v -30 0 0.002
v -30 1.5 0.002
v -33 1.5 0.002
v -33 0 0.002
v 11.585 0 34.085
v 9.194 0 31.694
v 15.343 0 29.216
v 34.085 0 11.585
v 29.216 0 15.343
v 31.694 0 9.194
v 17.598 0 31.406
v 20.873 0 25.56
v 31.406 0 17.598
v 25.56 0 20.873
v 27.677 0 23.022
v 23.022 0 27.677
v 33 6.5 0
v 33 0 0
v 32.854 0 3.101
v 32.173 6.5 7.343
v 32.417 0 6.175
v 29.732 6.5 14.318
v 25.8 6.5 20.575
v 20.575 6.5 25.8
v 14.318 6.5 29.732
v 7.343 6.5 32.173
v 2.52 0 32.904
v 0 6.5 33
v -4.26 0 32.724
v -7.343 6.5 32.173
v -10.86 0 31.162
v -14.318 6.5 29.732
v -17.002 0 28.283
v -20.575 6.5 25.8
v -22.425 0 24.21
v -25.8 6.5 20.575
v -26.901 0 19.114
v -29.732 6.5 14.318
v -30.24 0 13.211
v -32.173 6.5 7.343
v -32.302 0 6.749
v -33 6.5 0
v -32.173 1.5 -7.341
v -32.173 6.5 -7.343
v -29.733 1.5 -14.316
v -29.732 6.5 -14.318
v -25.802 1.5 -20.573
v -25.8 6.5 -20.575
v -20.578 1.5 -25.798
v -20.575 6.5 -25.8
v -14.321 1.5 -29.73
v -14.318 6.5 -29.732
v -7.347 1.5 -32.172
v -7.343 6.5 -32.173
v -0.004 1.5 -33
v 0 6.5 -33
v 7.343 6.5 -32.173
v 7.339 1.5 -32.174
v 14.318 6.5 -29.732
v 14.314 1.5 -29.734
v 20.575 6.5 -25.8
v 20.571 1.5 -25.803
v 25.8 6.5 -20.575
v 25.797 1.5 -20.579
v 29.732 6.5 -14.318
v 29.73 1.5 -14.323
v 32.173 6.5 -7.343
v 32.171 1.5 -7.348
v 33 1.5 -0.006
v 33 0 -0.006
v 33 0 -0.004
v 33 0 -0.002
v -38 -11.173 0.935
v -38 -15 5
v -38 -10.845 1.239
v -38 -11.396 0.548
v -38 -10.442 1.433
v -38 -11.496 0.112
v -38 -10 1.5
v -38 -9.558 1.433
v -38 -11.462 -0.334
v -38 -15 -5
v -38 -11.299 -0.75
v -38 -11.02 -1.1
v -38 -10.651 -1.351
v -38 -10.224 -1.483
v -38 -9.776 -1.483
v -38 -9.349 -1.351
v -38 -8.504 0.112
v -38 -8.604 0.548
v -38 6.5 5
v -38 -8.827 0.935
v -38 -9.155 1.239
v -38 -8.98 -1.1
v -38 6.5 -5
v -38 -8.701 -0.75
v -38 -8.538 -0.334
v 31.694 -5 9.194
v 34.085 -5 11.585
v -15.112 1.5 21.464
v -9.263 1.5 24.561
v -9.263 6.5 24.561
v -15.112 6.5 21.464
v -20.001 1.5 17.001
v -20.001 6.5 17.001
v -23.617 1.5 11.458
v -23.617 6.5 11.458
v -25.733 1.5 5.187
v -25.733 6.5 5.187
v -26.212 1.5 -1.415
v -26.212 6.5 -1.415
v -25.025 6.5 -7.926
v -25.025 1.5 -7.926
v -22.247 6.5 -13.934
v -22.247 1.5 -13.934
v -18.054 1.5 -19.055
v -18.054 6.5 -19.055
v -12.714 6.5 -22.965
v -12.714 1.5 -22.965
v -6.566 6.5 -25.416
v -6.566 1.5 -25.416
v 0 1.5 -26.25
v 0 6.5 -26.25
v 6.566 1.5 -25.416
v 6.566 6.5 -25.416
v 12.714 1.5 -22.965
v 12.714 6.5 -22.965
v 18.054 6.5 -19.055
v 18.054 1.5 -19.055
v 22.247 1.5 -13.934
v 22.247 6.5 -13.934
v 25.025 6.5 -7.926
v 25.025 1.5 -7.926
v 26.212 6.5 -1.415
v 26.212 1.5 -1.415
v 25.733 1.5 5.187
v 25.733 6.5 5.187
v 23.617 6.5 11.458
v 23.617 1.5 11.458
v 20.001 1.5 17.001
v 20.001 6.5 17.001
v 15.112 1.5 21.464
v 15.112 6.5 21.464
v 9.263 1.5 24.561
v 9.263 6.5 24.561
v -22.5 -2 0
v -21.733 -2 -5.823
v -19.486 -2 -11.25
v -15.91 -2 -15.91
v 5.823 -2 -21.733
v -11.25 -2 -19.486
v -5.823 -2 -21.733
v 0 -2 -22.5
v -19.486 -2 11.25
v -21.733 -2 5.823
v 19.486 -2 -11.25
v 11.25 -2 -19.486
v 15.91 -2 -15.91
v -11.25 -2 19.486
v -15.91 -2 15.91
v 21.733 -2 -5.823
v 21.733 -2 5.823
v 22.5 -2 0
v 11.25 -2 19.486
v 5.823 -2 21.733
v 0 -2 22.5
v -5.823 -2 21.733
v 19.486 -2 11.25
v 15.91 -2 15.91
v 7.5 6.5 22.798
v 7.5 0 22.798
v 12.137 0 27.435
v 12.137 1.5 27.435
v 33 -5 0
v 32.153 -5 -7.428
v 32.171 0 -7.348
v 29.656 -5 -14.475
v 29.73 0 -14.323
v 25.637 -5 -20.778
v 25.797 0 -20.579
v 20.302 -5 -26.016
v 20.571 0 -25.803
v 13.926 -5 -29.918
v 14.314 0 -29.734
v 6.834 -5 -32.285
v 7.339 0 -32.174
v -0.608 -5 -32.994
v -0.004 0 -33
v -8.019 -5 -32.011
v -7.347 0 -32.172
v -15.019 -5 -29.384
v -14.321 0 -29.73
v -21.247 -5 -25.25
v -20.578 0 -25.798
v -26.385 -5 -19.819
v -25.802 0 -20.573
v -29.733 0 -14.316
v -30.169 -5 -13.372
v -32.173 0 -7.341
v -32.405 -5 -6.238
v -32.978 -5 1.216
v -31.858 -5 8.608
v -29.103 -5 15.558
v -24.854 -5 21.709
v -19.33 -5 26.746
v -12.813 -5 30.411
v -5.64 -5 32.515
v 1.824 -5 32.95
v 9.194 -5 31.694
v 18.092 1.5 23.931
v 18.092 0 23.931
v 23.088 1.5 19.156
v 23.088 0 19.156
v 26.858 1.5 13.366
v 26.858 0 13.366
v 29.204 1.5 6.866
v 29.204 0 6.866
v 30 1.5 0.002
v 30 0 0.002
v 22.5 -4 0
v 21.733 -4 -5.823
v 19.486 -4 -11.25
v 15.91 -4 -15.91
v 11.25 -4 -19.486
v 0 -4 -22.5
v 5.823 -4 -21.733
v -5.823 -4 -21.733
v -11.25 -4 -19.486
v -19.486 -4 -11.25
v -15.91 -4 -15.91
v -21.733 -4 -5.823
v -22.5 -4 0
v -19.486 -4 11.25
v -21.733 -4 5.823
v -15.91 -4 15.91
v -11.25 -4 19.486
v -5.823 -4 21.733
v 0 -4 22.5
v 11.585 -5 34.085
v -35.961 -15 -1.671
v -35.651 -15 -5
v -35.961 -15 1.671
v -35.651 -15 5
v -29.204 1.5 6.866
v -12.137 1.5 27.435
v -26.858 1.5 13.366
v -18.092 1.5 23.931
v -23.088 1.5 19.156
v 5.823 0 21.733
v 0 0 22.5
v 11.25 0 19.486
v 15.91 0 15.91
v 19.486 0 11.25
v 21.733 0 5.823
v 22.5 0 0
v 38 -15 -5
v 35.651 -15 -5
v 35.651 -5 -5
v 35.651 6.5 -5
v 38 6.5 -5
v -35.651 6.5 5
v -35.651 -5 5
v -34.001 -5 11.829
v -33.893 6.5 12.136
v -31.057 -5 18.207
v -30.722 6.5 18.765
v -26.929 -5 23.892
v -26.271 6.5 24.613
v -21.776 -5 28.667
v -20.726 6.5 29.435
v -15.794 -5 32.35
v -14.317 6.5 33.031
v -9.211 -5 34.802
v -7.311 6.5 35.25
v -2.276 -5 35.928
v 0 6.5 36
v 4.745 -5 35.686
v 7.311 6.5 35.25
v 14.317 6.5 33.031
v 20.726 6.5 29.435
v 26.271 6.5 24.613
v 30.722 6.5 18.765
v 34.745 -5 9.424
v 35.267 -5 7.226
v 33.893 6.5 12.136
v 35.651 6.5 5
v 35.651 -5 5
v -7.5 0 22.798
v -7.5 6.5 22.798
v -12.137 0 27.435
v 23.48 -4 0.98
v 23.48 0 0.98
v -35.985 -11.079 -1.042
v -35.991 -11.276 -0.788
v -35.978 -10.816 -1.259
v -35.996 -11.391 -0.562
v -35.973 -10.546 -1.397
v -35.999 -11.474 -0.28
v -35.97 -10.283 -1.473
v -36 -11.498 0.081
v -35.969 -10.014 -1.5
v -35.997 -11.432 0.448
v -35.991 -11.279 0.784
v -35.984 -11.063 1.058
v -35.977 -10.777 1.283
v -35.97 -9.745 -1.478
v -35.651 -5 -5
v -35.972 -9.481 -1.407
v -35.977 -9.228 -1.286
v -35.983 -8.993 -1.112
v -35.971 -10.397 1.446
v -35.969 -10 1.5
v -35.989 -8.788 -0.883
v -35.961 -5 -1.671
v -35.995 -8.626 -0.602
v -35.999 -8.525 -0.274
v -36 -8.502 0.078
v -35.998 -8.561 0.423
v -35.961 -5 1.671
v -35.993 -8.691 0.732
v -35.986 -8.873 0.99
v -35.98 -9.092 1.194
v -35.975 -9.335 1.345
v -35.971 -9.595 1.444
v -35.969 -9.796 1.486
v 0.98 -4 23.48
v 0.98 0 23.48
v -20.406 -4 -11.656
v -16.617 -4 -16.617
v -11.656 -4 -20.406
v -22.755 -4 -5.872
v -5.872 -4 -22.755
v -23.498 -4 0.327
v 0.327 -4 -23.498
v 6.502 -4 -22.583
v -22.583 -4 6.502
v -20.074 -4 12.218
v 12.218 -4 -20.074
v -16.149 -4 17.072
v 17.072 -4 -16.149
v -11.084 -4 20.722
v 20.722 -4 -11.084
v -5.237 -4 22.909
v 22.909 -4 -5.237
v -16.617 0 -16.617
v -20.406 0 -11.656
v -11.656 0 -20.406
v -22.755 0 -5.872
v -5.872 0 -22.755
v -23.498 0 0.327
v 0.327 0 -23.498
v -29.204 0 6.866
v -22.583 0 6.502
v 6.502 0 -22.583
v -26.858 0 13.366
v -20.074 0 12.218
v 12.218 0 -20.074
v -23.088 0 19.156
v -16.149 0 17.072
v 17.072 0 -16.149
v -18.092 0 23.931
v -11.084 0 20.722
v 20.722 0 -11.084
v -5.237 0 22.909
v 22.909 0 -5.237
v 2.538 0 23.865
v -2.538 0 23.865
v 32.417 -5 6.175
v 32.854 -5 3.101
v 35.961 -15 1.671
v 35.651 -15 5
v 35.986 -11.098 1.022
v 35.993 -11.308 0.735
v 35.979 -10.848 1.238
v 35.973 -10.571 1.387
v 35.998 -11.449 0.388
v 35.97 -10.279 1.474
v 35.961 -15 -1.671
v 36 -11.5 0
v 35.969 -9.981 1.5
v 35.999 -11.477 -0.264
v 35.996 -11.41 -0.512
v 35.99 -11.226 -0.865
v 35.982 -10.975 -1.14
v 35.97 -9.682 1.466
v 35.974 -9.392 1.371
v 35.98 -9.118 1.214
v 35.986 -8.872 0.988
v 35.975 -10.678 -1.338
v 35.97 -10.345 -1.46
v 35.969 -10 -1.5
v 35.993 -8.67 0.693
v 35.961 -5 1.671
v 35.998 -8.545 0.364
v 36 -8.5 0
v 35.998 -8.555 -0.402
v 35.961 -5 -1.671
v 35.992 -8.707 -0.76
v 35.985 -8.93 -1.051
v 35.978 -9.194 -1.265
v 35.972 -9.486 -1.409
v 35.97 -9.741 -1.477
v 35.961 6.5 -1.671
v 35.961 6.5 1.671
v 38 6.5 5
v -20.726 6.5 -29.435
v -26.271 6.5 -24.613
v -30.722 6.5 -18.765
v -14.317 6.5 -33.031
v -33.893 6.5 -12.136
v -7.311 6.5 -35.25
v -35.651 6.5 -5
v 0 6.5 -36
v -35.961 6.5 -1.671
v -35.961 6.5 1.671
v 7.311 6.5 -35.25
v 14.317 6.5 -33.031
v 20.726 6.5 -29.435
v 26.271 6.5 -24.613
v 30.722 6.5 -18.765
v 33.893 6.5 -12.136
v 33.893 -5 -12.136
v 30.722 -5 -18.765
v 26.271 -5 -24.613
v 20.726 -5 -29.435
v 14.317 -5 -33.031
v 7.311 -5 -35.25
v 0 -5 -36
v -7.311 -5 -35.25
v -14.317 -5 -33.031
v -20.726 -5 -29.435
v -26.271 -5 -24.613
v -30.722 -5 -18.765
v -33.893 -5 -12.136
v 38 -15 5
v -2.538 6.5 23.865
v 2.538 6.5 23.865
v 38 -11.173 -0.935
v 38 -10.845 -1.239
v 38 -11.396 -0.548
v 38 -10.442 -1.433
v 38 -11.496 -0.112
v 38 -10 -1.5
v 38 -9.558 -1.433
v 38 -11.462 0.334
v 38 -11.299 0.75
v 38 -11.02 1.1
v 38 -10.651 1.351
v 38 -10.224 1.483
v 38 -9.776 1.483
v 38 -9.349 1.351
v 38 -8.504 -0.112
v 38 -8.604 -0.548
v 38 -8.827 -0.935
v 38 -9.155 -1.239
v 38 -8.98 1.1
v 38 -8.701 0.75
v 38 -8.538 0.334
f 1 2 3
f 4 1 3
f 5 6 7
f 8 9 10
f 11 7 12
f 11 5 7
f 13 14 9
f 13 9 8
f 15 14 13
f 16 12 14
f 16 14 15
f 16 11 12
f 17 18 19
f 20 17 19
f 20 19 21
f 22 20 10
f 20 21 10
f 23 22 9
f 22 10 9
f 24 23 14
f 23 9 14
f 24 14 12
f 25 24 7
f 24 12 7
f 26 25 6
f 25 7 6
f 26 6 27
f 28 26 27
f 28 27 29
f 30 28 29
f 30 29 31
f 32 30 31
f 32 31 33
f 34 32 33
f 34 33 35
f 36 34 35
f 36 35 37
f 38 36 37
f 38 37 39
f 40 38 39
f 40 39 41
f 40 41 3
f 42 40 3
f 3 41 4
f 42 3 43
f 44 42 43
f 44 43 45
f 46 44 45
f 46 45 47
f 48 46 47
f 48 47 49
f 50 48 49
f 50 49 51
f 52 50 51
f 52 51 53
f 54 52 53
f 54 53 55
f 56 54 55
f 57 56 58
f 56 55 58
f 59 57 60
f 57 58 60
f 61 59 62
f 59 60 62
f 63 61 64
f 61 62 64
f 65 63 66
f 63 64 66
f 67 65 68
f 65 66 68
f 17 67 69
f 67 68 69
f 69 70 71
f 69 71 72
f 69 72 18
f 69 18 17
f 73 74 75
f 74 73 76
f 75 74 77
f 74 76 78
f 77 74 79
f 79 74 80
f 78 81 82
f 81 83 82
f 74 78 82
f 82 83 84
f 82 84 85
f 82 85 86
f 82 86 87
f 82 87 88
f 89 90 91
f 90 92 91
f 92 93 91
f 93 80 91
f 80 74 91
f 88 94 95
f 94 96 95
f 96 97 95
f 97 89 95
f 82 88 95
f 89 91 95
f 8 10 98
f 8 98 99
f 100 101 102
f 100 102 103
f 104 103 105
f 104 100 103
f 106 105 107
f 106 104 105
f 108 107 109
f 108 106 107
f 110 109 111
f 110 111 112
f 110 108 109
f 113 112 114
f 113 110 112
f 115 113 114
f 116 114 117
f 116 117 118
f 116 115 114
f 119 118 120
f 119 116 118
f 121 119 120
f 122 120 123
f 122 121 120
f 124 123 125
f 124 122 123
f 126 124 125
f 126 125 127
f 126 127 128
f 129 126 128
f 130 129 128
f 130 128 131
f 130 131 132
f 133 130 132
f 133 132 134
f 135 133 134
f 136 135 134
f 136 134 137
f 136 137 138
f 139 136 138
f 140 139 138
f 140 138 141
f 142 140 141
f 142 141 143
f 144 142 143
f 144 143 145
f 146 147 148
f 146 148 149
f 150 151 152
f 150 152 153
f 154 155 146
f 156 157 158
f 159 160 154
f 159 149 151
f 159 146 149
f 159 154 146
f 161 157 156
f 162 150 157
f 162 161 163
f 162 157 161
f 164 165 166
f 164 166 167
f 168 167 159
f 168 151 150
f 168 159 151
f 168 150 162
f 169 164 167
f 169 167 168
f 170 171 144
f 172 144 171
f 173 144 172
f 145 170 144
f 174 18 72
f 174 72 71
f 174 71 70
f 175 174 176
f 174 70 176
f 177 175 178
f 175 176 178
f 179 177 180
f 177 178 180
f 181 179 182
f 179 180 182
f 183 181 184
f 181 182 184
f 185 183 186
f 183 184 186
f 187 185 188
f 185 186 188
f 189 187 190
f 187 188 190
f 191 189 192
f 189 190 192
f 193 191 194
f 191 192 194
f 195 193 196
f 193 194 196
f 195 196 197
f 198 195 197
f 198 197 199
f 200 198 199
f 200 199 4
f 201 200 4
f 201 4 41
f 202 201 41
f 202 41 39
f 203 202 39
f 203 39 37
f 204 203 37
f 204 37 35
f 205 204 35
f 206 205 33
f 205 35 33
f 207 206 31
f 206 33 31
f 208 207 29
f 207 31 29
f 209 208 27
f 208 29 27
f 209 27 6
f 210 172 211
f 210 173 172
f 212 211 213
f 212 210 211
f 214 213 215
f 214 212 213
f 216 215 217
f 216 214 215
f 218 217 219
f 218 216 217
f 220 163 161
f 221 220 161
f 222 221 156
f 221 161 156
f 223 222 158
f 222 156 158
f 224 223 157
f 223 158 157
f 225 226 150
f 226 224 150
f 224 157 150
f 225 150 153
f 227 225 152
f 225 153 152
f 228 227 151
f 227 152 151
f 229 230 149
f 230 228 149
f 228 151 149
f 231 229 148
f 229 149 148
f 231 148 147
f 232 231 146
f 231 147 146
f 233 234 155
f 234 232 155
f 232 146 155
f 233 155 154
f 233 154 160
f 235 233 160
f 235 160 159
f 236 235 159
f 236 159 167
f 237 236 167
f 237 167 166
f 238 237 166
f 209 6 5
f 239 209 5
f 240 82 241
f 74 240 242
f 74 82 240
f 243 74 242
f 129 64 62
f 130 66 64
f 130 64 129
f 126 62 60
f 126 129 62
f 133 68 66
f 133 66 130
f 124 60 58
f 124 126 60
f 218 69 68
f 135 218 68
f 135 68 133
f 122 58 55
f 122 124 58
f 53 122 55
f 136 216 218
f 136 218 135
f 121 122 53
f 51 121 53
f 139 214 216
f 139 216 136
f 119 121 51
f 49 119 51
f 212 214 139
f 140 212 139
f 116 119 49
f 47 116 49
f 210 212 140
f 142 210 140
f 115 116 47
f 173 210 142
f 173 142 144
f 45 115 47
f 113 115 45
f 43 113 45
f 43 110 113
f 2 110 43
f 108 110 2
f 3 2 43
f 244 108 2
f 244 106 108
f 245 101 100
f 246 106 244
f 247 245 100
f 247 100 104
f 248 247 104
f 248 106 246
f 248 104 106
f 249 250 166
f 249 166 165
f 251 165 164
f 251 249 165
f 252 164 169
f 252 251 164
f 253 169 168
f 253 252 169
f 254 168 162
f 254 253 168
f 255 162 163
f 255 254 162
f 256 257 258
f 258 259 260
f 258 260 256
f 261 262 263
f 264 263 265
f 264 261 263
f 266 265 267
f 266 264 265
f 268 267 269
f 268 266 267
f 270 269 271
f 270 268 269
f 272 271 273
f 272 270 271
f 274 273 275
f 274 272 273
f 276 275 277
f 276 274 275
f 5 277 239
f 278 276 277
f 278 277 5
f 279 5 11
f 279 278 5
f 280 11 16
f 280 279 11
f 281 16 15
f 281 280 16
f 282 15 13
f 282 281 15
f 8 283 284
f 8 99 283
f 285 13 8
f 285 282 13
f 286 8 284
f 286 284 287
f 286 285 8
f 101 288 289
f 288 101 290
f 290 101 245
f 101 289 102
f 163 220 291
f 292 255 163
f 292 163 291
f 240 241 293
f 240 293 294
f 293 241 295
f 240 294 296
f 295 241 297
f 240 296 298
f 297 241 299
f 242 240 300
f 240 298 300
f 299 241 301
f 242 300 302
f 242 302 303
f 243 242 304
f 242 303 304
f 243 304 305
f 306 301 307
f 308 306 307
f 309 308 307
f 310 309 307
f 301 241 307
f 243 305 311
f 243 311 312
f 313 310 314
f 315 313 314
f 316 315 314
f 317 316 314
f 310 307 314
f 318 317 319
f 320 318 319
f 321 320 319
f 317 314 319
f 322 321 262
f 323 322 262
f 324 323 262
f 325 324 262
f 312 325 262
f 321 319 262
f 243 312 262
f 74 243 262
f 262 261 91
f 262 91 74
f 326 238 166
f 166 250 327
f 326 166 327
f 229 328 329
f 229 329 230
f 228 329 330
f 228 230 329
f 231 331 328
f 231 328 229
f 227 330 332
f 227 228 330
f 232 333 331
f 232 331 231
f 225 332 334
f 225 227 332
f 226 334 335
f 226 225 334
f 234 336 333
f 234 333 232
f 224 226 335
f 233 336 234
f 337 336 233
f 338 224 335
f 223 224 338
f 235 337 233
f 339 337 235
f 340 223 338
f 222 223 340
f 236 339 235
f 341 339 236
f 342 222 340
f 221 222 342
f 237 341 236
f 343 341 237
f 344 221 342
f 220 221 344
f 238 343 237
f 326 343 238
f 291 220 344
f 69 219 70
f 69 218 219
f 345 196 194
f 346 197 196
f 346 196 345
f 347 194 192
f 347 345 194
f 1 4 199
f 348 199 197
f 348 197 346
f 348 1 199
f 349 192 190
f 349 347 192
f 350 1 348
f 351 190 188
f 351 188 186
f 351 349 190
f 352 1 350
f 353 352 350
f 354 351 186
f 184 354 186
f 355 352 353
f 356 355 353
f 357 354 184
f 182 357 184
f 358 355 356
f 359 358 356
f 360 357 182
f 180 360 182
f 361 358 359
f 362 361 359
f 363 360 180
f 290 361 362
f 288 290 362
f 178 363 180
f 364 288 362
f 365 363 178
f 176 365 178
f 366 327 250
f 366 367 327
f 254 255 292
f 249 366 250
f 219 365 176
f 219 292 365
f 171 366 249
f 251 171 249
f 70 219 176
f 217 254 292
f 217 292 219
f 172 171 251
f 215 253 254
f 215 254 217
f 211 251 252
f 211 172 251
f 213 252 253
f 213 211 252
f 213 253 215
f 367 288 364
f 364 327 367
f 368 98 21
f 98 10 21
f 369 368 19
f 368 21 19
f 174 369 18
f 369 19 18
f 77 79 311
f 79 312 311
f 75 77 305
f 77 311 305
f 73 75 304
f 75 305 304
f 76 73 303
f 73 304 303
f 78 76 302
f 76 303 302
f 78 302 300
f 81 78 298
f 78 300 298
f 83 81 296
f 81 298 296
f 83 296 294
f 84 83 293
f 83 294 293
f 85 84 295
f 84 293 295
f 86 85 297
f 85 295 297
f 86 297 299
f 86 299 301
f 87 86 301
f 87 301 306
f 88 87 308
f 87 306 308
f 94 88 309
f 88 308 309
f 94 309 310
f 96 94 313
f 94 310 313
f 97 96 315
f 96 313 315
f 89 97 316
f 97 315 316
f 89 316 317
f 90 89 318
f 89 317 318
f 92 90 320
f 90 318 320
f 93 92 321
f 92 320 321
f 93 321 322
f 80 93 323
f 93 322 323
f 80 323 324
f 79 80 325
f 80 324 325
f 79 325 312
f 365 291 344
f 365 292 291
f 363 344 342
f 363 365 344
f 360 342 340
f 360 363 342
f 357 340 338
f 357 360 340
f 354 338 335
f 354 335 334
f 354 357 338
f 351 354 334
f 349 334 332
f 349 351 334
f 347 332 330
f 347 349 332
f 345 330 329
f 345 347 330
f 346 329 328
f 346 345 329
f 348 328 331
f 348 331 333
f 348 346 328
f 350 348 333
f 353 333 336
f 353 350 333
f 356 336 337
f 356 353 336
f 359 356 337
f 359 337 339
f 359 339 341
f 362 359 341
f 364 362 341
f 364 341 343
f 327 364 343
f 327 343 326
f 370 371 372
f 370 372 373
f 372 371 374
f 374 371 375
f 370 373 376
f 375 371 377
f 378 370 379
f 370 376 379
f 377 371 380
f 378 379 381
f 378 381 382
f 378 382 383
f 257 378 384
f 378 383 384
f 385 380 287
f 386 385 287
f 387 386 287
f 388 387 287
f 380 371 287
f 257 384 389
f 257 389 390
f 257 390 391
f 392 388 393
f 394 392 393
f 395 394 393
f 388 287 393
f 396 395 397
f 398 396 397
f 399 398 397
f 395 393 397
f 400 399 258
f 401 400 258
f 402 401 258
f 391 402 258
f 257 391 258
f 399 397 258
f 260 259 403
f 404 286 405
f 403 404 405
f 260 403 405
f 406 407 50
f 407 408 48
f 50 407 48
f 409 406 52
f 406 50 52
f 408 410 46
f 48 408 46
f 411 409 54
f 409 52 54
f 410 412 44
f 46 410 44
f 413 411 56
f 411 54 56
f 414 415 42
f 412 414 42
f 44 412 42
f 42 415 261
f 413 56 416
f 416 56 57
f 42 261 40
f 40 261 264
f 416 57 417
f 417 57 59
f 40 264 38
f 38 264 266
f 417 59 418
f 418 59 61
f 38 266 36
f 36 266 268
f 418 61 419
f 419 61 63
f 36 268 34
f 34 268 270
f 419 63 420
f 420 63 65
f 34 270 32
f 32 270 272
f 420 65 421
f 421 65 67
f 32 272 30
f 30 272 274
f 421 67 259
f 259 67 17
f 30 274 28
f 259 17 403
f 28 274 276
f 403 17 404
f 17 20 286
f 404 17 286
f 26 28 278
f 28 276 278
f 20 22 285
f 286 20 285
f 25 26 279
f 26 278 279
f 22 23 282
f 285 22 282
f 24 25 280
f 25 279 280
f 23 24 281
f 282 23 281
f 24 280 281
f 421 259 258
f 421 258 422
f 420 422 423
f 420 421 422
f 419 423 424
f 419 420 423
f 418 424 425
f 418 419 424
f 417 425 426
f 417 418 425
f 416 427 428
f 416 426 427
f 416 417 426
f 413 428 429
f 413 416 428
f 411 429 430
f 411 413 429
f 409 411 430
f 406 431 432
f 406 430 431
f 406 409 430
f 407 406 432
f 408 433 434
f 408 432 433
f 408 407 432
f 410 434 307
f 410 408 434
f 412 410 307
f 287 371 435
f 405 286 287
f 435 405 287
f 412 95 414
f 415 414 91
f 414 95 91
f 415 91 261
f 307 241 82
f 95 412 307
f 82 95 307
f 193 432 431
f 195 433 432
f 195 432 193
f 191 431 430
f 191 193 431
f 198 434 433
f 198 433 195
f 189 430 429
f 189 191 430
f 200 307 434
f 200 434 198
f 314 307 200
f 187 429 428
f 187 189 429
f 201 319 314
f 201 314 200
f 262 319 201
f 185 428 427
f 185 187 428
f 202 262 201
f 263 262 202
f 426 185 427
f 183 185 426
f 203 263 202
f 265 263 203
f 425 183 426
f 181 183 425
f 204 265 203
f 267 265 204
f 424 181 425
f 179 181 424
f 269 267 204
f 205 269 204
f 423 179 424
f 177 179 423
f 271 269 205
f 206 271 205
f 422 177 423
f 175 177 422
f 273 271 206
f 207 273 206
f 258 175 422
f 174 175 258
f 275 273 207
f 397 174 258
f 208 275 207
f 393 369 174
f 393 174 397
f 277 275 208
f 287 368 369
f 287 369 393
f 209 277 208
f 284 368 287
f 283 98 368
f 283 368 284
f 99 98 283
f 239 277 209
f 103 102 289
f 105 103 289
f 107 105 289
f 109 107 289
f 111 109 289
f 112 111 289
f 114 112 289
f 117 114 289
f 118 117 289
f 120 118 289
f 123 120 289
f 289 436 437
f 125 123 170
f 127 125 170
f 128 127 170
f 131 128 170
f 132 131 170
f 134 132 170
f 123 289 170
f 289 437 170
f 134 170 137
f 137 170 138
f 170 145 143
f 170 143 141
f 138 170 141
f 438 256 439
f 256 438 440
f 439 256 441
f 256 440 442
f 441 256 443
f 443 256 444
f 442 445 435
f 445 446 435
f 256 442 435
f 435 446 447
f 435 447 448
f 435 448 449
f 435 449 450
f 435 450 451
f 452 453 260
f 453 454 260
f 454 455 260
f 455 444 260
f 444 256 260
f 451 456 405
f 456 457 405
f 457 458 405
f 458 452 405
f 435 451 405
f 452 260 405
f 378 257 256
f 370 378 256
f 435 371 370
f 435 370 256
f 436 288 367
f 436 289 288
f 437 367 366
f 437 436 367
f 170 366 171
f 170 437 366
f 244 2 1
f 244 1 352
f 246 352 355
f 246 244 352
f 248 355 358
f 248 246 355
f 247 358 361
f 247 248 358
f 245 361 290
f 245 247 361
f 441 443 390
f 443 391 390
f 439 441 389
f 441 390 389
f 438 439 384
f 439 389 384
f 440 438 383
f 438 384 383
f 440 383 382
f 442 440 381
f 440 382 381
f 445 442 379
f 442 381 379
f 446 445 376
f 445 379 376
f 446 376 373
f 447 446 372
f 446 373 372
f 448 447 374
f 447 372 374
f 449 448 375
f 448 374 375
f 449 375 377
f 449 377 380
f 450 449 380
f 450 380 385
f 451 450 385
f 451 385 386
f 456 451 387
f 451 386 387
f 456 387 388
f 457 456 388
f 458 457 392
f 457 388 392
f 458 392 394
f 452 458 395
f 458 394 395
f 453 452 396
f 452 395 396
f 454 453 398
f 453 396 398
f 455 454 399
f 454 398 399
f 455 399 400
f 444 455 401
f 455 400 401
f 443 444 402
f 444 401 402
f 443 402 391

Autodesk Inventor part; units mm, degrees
ref_plane "YZ Plane" through (0, 0, 0) normal (1, 0, 0) x (0, 1, 0)
ref_plane "XZ Plane" through (0, 0, 0) normal (0, 1, 0) x (-1, 0, 0)
ref_plane "XY Plane" through (0, 0, 0) normal (0, 0, 1) x (1, 0, 0)
sketch "Sketch1" plane through (0, 0, 0) normal (0, 1, 0) x (-1, 0, 0)
  circle A0 centre (0, 0) radius 26.25
  circle A1 centre (0, 0) radius 33
  dimension "d0" = 52.5
  dimension "d1" = 66
extrude "Extrusion1" add sketch "Sketch1" along normal blind 1.5
sketch "Sketch2" plane through (0, 1.5, 0) normal (0, 1, 0) x (1, 0, 0)
  circle A0 centre (0, 0) radius 25
  circle A1 centre (0, 0) radius 33 projected
  line L0 (-7.5, -23.8485) -> (-13.6817, -30.0302)
  circle A2 centre (0, 0) radius 33 projected
  line L1 (-7.5, -23.8485) -> (1.2422, -23.8485) construction
  line L2 (7.5, -23.8485) -> (13.6817, -30.0302)
  line L3 (7.5, -23.8485) -> (16.2422, -23.8485) construction
  point P0 (0, -25)
  dimension "d4" = 50
  dimension "d5" = 135
  dimension "d6" = 45
  dimension "d7" = 15
  dimension "d9" = 7.5
  dimension "d10" = 0
  dimension "d66" = 8
extrude "Extrusion2" cut sketch "Sketch2" against normal blind 1.5 contours A0 L2 A1 L0 picked at (9.3939, -28.7092)
sketch "Sketch3" plane through (0, 1.5, 0) normal (0, 1, 0) x (1, 0, 0)
  circle A0 centre (0, 0) radius 30
  arc A1 (13.6817, -30.0302) -> (-13.6817, -30.0302) centre (0, 0) ccw projected
  line L0 (8.4905, -24.839) -> (13.6817, -30.0302) projected
  line L1 (-30, -0.0025) -> (-33, -0.0025)
  arc A2 (13.6817, -30.0302) -> (-13.6817, -30.0302) centre (0, 0) ccw projected
  line L2 (-30, -0.0025) -> (-27, -0.0025) construction
  line L3 (-10.6624, -27.0109) -> (-13.6817, -30.0302)
  line L4 (13.6817, -30.0302) -> (8.4905, -24.839) projected
  line L5 (11.4008, -27.7493) -> (13.6817, -30.0302)
  line L6 (-8.4905, -24.839) -> (-13.6817, -30.0302) projected
  line L7 (-11.4008, -27.7493) -> (-13.6817, -30.0302)
  line L8 (30, -0.0025) -> (33, 0.0056)
  point P0 (7.5, -26.4575)
  point P1 (-7.5, -26.4575)
  dimension "d13" = 60
  dimension "d14" = 180
extrude "Extrusion3" cut sketch "Sketch3" against normal blind 10 contours A0 L3 A1 L1 | L8 A1 L0 A0
sketch "Sketch8" plane through (0, 0, 0) normal (0, -1, 0) x (1, 0, 0)
  circle A0 centre (0, 0) radius 33
  circle A1 centre (0, 0) radius 36
  dimension "d29" = 66
  dimension "d30" = 3
  dimension "d91" = 72
extrude "Extrusion8" add sketch "Sketch8" against normal blind 6.5
sketch "Sketch16" plane through (0, 0, 0) normal (0, -1, 0) x (1, 0, 0)
  circle A0 centre (0, 0) radius 26.25
  dimension "d67" = 52.5
extrude "Extrusion13" add sketch "Sketch16" against normal blind 6.5
sketch "Sketch19" plane through (0, 6.5, 0) normal (0, 1, 0) x (1, 0, 0)
  circle A0 centre (0, 0) radius 24
  circle A1 centre (0, 0) radius 33
  line L0 (-7.5, -22.798) -> (-14.3681, -29.6661)
  circle A2 centre (0, 0) radius 32.9624
  line L1 (-7.5, -22.798) -> (2.213, -22.798) construction
  line L2 (7.5, -22.798) -> (14.3681, -29.6661)
  line L3 (7.5, -22.798) -> (17.213, -22.798) construction
  point P0 (0, -24)
  dimension "d70" = 48
  dimension "d71" = 135
  dimension "d72" = 45
  dimension "d73" = 15
  dimension "d74" = 7.5
  dimension "d75" = 0
  dimension "d76" = 9
  dimension "d138" = 66
extrude "Extrusion14" cut sketch "Sketch19" against normal blind 6.5 contours A0 L2 A2 L0 picked at (9.7463, -28.1973)
sketch "Sketch20" plane through (0, 0, 0) normal (0, -1, 0) x (1, 0, 0)
  circle A0 centre (0, 0) radius 36 projected
  circle A1 centre (0, 0) radius 33
  dimension "d81" = 72
  dimension "d82" = 3
  dimension "d134" = 66
extrude "Extrusion15" add sketch "Sketch20" along normal blind 5
thread "Thread1" size "M68x6" class "6H" standard "ANSI Metric M Profile" length 5 offset 6.5
sketch "Sketch21" plane through (0, 0, 0) normal (0, -1, 0) x (1, 0, 0)
  circle A0 centre (0, 0) radius 22.5
  circle A1 centre (0, 0) radius 23.5
  dimension "d87" = 45
  dimension "d88" = 1
extrude "Extrusion16" add sketch "Sketch21" along normal blind 4
sketch "Sketch23" plane through (0, 0, 0) normal (0, -1, 0) x (1, 0, 0)
  circle A0 centre (0, 0) radius 22.5 projected
  line L0 (22.5, 0) -> (0, 22.5)
  line L1 (0, 22.5) -> (20.147, 42.647)
  line L2 (22.5, 0) -> (42.647, 20.147)
  line L3 (42.647, 20.147) -> (20.147, 42.647)
extrude "Extrusion17" cut sketch "Sketch23" along normal blind 5 contours A0 L1 L3 L2
sketch "Sketch24" plane through (0, 0, 0) normal (0, -1, 0) x (1, 0, 0)
  circle A0 centre (0, 0) radius 22.5
  dimension "d96" = 45
extrude "Extrusion18" add sketch "Sketch24" along normal blind 2
sketch "Sketch25" plane through (0, -5, 0) normal (0, -1, 0) x (1, 0, 0)
  line L0 (0, -5) -> (0, 5)
  line L1 (0, -5) -> (38, -5)
  line L2 (0, 5) -> (38, 5)
  line L3 (38, -5) -> (38, 5)
  circle A0 centre (0, 0) radius 36 projected
  line L4 (0, -5) -> (-38, -5)
  line L5 (0, 5) -> (-38, 5)
  line L6 (-38, 5) -> (-38, -5)
  point P0 (35.6511, -5)
  point P1 (35.6511, 5)
  point P2 (-35.6511, -5)
  point P3 (-35.6511, 5)
  dimension "d99" = 10
  dimension "d100" = 5
  dimension "d101" = 38
  dimension "d102" = 38
  dimension "d107" = 38
  dimension "d133" = 72
extrude "Extrusion19" add sketch "Sketch25" along normal blind 10 and the other way blind 11.5 contours A0 L2 L3 L1 | L4 L6 L5 A0
sketch "Sketch26" plane through (38, -15, 5) normal (1, 0, 0) x (0, 0, -1)
  circle A0 centre (5, 5) radius 1.5
  line L0 (10, 0) -> (0, 0) projected
  line L1 (0, 10) -> (10, 10) projected
  line L2 (0, 10) -> (0, 0) projected
  line L3 (0, 21.5) -> (10, 21.5) projected
  point P0 (5, 15)
  dimension "d108" = 3
  dimension "d110" = 10
  dimension "d112" = 5
  dimension "d132" = 5
  dimension "d135" = 16.5
  dimension "d136" = 21.5
  dimension "d137" = 5
hole "Hole3" at (38, -10, 0) direction (-1, 0, 0) diameter 3 depth 8 tip angle 118
sketch "Sketch27" plane through (-38, -15, -5) normal (-1, 0, 0) x (0, 0, 1)
  line L0 (10, 0) -> (0, 0) projected
  line L1 (0, 10) -> (10, 10) projected
  circle A0 centre (5, 5) radius 1.5
  line L2 (10, 21.5) -> (10, 0) projected
  line L3 (0, 0) -> (0, 21.5) projected
  point P0 (5, 15)
  dimension "d120" = 10
  dimension "d121" = 3
  dimension "d122" = 5
  dimension "d123" = 10
  dimension "d124" = 5
hole "Hole4" at (-38, -10, 0) direction (1, 0, 0) diameter 3 depth 8 tip angle 118
equation "\"d102\" = d101"
equation "\"d107\" = d101"
properties part number "clock_case2"
